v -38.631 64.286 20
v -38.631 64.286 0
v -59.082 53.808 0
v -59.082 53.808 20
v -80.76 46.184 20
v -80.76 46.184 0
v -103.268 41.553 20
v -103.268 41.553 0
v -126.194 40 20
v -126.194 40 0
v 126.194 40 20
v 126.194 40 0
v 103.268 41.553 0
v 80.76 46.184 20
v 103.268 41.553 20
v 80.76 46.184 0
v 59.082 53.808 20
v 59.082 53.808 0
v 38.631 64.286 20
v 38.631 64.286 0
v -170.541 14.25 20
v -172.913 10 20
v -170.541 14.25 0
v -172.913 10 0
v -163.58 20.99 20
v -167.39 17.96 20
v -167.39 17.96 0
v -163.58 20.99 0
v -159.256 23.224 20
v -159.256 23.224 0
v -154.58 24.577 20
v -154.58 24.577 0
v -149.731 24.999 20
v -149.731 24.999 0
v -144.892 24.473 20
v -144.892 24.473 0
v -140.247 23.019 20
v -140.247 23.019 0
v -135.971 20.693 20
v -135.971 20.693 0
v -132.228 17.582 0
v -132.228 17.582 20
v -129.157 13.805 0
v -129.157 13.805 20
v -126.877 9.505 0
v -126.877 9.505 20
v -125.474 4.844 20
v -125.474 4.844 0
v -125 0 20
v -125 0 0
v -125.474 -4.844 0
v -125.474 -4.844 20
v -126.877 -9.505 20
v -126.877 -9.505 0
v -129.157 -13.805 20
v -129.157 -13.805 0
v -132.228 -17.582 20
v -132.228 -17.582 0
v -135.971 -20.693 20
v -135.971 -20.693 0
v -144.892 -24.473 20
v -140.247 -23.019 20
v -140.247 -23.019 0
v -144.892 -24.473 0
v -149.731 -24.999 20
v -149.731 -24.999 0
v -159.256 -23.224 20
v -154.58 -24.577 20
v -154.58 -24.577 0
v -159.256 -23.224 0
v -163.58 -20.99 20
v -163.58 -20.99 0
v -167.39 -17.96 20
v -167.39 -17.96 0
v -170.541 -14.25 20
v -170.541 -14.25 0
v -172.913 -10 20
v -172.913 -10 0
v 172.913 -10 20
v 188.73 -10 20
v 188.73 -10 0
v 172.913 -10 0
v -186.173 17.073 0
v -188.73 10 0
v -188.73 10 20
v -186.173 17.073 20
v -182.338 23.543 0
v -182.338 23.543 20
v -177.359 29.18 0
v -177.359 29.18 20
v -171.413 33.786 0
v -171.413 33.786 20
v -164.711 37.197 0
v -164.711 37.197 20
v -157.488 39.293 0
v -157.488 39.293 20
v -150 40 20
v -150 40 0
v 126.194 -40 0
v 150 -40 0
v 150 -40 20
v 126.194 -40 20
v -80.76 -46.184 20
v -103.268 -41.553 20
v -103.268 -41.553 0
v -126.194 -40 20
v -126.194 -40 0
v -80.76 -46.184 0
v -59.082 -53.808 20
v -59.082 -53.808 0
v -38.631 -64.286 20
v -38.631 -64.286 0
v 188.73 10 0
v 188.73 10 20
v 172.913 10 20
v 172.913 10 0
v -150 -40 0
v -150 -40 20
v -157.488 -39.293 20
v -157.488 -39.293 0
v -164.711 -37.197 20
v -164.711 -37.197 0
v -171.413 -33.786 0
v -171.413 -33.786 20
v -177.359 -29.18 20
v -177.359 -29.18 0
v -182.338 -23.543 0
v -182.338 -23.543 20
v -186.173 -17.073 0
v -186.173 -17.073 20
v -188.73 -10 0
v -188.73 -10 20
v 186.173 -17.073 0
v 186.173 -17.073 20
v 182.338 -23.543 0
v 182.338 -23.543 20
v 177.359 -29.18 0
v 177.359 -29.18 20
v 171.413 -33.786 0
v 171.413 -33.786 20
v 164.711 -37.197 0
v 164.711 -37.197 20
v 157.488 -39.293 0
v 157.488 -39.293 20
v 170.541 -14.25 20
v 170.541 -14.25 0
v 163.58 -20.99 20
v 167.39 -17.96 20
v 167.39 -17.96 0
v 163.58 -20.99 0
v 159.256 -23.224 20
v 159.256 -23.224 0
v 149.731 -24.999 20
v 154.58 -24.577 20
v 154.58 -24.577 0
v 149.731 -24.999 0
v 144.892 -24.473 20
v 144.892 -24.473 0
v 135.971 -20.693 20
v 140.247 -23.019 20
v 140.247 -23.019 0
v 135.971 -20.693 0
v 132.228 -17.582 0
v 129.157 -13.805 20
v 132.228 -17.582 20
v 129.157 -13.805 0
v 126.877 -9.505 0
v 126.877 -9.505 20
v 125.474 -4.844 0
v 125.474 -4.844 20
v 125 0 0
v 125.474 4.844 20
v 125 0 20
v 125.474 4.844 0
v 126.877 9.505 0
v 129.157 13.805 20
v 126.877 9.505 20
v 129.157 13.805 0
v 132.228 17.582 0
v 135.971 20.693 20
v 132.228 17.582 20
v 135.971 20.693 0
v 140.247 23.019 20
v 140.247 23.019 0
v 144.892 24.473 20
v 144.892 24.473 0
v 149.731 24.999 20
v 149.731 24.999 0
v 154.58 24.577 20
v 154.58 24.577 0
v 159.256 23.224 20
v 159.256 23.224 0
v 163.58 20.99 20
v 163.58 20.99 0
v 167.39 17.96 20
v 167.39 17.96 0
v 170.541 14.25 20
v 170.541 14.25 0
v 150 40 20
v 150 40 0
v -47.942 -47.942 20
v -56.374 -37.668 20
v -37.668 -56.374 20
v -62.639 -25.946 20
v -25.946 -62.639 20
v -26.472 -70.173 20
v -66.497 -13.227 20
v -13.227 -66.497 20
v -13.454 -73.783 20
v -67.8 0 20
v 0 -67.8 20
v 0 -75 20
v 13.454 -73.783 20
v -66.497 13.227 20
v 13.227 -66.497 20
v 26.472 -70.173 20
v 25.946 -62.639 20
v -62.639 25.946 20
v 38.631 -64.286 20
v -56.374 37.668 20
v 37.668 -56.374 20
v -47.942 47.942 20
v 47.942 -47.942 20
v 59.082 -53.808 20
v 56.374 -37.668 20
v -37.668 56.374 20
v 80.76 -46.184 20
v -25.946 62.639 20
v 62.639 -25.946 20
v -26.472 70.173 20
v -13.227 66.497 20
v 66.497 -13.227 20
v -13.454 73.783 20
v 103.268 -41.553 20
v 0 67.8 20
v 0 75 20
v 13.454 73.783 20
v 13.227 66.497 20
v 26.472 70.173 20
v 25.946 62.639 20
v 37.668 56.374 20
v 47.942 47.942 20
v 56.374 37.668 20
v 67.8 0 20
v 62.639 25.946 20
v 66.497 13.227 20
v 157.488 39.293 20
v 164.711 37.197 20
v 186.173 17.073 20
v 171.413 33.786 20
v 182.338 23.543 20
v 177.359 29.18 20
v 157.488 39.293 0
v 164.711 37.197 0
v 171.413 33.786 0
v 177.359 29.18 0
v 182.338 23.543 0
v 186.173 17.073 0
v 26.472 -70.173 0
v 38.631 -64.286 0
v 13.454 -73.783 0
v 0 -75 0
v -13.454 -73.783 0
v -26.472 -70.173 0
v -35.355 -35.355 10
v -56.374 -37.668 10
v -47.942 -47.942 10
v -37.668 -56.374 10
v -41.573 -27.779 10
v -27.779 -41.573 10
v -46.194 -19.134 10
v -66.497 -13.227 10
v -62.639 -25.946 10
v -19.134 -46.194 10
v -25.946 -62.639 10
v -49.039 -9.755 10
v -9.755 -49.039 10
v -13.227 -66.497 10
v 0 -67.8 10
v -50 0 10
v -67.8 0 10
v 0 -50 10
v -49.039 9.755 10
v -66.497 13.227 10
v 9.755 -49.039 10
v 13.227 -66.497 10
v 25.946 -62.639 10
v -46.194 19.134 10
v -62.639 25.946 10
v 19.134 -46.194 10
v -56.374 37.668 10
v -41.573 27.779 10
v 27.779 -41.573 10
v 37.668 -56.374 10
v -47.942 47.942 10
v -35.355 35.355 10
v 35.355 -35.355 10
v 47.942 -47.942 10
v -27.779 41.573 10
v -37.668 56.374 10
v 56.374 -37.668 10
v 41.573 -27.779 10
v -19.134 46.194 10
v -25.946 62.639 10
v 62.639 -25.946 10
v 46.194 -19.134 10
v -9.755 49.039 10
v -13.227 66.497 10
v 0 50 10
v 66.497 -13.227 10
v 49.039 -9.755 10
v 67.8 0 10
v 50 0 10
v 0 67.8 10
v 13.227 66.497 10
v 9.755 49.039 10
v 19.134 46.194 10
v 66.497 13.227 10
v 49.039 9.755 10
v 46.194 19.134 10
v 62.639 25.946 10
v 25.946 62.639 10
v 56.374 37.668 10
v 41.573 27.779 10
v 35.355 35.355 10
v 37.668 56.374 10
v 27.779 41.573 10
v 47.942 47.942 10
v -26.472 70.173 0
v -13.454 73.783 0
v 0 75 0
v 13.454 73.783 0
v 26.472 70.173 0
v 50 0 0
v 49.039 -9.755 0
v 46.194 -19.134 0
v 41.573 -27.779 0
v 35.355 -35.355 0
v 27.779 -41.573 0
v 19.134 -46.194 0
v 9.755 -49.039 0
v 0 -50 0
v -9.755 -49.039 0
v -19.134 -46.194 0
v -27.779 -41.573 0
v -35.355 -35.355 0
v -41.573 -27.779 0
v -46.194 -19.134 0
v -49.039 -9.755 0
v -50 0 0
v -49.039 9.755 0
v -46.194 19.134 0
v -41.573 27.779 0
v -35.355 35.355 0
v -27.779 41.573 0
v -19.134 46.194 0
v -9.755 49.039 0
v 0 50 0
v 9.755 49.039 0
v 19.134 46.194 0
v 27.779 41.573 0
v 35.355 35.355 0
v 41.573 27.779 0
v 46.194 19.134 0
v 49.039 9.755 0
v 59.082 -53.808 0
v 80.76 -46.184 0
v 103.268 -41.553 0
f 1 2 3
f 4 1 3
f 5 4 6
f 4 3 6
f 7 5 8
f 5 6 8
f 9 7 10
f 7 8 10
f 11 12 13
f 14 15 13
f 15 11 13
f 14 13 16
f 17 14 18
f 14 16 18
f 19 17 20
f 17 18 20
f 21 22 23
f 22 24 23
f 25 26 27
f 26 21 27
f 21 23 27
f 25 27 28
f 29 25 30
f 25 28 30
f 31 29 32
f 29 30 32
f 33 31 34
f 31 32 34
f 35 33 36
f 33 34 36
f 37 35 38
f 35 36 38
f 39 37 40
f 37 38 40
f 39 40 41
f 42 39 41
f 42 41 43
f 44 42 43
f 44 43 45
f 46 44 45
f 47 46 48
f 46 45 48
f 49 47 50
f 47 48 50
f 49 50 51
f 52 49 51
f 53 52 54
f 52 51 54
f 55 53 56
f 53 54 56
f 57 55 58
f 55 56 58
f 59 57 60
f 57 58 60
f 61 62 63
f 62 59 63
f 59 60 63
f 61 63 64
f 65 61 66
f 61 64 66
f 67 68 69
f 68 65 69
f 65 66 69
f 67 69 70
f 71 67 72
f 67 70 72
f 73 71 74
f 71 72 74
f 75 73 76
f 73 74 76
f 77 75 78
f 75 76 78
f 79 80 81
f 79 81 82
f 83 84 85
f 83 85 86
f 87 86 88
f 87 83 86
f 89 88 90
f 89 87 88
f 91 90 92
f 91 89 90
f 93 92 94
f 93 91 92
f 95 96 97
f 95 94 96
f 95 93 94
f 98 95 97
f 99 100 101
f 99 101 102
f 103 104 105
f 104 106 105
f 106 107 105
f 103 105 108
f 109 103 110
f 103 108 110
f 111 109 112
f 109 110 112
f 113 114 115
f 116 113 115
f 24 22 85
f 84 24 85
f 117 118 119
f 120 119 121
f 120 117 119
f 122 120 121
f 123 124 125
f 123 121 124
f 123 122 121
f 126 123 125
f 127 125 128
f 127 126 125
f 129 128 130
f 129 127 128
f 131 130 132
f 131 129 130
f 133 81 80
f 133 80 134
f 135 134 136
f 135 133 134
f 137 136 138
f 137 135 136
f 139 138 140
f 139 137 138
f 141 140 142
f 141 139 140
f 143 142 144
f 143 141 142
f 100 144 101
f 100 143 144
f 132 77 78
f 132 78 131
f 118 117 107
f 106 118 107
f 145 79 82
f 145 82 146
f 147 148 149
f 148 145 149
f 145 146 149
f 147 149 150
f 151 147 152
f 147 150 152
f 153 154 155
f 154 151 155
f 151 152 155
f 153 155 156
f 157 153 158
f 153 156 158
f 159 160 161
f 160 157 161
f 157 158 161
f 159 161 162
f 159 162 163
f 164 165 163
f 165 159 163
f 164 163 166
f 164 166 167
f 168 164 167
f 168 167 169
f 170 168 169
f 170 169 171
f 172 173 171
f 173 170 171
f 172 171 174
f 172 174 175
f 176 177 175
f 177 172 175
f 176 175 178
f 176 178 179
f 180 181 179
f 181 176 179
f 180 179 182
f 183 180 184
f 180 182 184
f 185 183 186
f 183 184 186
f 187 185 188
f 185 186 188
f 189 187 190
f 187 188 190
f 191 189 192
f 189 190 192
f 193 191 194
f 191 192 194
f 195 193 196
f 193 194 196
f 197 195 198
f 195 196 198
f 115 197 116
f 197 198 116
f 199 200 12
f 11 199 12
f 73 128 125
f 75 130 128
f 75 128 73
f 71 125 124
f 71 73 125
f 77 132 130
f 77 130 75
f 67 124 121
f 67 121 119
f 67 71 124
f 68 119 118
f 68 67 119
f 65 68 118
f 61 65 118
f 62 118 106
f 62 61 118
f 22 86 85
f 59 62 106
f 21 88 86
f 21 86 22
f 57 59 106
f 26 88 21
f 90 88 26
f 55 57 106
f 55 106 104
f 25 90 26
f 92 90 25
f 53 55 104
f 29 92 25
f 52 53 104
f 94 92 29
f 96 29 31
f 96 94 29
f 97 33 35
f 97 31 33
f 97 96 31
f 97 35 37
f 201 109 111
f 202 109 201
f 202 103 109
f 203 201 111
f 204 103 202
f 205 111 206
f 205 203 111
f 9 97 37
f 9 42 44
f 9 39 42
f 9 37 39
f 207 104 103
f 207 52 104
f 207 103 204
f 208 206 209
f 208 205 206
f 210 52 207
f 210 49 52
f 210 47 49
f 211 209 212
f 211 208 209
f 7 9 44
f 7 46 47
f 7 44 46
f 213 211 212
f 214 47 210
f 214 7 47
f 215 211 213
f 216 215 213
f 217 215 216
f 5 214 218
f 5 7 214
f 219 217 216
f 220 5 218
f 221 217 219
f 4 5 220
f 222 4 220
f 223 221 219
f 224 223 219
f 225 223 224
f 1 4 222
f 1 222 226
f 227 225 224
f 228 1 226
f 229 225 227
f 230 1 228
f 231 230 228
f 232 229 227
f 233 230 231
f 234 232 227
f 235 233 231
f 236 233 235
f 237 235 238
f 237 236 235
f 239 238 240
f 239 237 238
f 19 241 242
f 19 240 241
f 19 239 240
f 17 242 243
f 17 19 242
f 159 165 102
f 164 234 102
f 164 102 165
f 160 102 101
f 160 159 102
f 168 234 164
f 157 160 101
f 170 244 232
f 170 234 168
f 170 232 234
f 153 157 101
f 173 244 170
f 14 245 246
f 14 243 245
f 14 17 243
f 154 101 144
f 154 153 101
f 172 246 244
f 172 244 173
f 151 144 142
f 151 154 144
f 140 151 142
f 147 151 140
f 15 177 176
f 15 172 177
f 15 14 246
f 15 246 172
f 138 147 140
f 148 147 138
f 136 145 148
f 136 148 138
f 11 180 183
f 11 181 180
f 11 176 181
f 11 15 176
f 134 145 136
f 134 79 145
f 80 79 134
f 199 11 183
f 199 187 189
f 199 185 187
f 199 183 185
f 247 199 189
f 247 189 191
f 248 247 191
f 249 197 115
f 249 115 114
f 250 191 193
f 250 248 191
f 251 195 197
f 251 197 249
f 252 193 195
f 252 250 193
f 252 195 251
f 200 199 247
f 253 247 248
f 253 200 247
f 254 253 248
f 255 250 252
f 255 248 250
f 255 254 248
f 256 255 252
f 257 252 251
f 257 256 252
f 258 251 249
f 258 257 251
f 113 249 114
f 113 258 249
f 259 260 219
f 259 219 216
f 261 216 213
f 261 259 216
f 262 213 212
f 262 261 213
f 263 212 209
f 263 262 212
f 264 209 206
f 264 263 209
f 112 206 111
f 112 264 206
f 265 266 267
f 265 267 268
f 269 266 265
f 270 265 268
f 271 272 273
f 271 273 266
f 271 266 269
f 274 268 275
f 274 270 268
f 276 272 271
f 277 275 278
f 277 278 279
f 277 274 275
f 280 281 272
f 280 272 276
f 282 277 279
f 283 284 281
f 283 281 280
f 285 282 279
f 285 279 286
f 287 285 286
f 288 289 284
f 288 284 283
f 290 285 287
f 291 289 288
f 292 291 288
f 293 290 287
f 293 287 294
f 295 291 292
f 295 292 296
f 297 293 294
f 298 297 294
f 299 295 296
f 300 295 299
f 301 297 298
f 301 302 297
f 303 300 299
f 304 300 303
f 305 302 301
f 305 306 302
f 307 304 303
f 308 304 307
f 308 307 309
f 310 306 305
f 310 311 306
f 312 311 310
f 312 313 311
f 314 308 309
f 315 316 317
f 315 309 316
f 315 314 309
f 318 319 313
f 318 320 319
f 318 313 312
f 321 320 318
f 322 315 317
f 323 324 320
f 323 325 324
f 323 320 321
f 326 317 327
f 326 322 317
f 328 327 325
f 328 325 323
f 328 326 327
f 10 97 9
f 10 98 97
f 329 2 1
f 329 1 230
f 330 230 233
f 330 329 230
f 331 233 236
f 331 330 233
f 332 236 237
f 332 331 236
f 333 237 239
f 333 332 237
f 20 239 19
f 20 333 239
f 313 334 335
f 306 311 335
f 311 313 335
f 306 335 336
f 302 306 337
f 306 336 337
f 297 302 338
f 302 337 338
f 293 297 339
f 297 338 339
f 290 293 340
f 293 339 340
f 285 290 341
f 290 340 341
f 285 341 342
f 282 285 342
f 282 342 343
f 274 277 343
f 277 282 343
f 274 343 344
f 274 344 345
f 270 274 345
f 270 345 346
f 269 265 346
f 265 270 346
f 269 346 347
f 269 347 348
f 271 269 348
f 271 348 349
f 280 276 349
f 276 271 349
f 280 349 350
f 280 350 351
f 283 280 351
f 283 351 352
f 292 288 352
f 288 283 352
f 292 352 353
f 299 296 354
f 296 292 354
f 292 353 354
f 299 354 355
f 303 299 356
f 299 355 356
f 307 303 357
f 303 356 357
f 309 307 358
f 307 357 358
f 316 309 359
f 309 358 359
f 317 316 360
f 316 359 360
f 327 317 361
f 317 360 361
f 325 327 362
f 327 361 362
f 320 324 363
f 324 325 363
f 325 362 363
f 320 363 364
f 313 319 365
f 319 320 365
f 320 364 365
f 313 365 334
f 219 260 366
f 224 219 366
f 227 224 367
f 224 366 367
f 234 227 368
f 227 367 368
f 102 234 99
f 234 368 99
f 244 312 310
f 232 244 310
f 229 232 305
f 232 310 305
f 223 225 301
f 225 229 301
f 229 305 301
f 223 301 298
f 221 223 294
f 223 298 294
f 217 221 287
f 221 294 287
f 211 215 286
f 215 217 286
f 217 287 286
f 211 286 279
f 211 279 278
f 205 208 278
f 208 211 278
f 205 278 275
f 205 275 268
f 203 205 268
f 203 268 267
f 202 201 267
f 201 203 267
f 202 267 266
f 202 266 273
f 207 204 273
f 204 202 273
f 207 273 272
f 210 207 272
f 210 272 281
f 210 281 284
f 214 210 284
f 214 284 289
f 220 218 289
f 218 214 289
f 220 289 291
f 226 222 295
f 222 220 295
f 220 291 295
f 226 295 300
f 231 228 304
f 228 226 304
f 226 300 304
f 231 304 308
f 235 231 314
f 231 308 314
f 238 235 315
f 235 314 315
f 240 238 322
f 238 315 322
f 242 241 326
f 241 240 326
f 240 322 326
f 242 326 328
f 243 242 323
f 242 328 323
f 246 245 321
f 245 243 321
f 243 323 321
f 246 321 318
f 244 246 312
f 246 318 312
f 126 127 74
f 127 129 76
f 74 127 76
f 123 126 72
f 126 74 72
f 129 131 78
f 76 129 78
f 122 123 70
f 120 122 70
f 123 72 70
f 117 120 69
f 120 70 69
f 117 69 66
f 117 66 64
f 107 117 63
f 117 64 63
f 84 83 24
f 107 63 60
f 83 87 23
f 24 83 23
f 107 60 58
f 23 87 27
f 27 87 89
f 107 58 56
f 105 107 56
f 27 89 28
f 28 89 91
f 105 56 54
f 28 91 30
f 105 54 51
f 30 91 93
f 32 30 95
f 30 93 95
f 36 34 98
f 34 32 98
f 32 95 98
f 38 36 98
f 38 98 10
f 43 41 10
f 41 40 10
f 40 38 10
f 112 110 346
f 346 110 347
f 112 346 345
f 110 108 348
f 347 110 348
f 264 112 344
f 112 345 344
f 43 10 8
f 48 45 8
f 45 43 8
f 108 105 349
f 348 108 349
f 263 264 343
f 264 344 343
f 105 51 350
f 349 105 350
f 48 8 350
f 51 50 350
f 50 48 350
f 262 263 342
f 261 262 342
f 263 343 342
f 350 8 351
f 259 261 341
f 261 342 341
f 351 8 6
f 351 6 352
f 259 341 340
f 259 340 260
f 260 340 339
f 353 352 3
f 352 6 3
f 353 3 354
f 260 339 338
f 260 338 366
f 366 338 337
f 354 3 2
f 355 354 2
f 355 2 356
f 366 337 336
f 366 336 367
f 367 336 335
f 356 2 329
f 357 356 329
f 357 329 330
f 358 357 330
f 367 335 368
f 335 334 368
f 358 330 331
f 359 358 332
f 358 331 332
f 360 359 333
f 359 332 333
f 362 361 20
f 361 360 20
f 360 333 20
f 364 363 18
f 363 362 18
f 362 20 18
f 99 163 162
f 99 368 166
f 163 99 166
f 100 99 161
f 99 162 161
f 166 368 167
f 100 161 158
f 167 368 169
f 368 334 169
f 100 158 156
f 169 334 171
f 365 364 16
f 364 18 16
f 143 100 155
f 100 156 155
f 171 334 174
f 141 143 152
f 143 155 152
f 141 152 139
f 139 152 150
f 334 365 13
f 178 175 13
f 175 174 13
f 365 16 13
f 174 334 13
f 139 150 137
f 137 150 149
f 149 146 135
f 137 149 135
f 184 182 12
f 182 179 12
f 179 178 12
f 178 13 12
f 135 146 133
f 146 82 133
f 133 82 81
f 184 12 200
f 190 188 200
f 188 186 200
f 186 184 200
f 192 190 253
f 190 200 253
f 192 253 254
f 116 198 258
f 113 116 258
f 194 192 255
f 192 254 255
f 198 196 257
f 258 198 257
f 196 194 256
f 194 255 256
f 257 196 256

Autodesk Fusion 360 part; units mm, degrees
sketch "Sketch1" plane through (0, 0, 0) normal (0, 0, 1) x (1, 0, 0)
  circle A0 centre (0, 0) radius 67.8
  circle A1 centre (0, 0) radius 50
  line L0 (-150, 40) -> (-126.1943, 40)
  line L1 (-150, -40) -> (-126.1943, -40)
  line L2 (150, 40) -> (126.1943, 40)
  line L3 (150, -40) -> (126.1943, -40)
  arc A2 (-38.6309, -64.2857) -> (38.6309, -64.2857) centre (0, 0) ccw
  arc A3 (38.6309, 64.2857) -> (-38.6309, 64.2857) centre (0, 0) ccw
  line L4 (-172.9129, 10) -> (-188.7298, 10)
  line L5 (-172.9129, -10) -> (-188.7298, -10)
  arc A4 (-172.9129, -10) -> (-172.9129, 10) centre (-150, 0) ccw
  arc A5 (-150, 40) -> (-188.7298, 10) centre (-150, 0) ccw
  arc A6 (-188.7298, -10) -> (-150, -40) centre (-150, 0) ccw
  line L6 (188.7298, 10) -> (172.9129, 10)
  line L7 (188.7298, -10) -> (172.9129, -10)
  arc A7 (172.9129, 10) -> (172.9129, -10) centre (150, 0) ccw
  arc A8 (150, -40) -> (188.7298, -10) centre (150, 0) ccw
  arc A9 (188.7298, 10) -> (150, 40) centre (150, 0) ccw
  arc A10 (-126.1943, 40) -> (-38.6309, 64.2857) centre (-126.1943, 210) ccw
  arc A11 (-38.6309, -64.2857) -> (-126.1943, -40) centre (-126.1943, -210) ccw
  arc A12 (38.6309, 64.2857) -> (126.1943, 40) centre (126.1943, 210) ccw
  arc A13 (126.1943, -40) -> (38.6309, -64.2857) centre (126.1943, -210) ccw
  dimension "d1" = 135.6
  dimension "d2" = 100
  dimension "d3" = 50
  dimension "d4" = 50
  dimension "d5" = 150
  dimension "d6" = 150
  dimension "d7" = 150
  dimension "d8" = 80
  dimension "d9" = 80
  dimension "d16" = 170
  dimension "d17" = 170
  dimension "d18" = 170
extrude "Extrude1" add sketch "Sketch1" along normal blind 20 contours L0 L1 L2 L3 A2 A3 L4 L5 A4 A5 A6 L6 L7 A7 A8 A9 A10 A11 A12 A13
extrude "Extrude2" add sketch "Sketch1" along normal blind 10 contours A0
